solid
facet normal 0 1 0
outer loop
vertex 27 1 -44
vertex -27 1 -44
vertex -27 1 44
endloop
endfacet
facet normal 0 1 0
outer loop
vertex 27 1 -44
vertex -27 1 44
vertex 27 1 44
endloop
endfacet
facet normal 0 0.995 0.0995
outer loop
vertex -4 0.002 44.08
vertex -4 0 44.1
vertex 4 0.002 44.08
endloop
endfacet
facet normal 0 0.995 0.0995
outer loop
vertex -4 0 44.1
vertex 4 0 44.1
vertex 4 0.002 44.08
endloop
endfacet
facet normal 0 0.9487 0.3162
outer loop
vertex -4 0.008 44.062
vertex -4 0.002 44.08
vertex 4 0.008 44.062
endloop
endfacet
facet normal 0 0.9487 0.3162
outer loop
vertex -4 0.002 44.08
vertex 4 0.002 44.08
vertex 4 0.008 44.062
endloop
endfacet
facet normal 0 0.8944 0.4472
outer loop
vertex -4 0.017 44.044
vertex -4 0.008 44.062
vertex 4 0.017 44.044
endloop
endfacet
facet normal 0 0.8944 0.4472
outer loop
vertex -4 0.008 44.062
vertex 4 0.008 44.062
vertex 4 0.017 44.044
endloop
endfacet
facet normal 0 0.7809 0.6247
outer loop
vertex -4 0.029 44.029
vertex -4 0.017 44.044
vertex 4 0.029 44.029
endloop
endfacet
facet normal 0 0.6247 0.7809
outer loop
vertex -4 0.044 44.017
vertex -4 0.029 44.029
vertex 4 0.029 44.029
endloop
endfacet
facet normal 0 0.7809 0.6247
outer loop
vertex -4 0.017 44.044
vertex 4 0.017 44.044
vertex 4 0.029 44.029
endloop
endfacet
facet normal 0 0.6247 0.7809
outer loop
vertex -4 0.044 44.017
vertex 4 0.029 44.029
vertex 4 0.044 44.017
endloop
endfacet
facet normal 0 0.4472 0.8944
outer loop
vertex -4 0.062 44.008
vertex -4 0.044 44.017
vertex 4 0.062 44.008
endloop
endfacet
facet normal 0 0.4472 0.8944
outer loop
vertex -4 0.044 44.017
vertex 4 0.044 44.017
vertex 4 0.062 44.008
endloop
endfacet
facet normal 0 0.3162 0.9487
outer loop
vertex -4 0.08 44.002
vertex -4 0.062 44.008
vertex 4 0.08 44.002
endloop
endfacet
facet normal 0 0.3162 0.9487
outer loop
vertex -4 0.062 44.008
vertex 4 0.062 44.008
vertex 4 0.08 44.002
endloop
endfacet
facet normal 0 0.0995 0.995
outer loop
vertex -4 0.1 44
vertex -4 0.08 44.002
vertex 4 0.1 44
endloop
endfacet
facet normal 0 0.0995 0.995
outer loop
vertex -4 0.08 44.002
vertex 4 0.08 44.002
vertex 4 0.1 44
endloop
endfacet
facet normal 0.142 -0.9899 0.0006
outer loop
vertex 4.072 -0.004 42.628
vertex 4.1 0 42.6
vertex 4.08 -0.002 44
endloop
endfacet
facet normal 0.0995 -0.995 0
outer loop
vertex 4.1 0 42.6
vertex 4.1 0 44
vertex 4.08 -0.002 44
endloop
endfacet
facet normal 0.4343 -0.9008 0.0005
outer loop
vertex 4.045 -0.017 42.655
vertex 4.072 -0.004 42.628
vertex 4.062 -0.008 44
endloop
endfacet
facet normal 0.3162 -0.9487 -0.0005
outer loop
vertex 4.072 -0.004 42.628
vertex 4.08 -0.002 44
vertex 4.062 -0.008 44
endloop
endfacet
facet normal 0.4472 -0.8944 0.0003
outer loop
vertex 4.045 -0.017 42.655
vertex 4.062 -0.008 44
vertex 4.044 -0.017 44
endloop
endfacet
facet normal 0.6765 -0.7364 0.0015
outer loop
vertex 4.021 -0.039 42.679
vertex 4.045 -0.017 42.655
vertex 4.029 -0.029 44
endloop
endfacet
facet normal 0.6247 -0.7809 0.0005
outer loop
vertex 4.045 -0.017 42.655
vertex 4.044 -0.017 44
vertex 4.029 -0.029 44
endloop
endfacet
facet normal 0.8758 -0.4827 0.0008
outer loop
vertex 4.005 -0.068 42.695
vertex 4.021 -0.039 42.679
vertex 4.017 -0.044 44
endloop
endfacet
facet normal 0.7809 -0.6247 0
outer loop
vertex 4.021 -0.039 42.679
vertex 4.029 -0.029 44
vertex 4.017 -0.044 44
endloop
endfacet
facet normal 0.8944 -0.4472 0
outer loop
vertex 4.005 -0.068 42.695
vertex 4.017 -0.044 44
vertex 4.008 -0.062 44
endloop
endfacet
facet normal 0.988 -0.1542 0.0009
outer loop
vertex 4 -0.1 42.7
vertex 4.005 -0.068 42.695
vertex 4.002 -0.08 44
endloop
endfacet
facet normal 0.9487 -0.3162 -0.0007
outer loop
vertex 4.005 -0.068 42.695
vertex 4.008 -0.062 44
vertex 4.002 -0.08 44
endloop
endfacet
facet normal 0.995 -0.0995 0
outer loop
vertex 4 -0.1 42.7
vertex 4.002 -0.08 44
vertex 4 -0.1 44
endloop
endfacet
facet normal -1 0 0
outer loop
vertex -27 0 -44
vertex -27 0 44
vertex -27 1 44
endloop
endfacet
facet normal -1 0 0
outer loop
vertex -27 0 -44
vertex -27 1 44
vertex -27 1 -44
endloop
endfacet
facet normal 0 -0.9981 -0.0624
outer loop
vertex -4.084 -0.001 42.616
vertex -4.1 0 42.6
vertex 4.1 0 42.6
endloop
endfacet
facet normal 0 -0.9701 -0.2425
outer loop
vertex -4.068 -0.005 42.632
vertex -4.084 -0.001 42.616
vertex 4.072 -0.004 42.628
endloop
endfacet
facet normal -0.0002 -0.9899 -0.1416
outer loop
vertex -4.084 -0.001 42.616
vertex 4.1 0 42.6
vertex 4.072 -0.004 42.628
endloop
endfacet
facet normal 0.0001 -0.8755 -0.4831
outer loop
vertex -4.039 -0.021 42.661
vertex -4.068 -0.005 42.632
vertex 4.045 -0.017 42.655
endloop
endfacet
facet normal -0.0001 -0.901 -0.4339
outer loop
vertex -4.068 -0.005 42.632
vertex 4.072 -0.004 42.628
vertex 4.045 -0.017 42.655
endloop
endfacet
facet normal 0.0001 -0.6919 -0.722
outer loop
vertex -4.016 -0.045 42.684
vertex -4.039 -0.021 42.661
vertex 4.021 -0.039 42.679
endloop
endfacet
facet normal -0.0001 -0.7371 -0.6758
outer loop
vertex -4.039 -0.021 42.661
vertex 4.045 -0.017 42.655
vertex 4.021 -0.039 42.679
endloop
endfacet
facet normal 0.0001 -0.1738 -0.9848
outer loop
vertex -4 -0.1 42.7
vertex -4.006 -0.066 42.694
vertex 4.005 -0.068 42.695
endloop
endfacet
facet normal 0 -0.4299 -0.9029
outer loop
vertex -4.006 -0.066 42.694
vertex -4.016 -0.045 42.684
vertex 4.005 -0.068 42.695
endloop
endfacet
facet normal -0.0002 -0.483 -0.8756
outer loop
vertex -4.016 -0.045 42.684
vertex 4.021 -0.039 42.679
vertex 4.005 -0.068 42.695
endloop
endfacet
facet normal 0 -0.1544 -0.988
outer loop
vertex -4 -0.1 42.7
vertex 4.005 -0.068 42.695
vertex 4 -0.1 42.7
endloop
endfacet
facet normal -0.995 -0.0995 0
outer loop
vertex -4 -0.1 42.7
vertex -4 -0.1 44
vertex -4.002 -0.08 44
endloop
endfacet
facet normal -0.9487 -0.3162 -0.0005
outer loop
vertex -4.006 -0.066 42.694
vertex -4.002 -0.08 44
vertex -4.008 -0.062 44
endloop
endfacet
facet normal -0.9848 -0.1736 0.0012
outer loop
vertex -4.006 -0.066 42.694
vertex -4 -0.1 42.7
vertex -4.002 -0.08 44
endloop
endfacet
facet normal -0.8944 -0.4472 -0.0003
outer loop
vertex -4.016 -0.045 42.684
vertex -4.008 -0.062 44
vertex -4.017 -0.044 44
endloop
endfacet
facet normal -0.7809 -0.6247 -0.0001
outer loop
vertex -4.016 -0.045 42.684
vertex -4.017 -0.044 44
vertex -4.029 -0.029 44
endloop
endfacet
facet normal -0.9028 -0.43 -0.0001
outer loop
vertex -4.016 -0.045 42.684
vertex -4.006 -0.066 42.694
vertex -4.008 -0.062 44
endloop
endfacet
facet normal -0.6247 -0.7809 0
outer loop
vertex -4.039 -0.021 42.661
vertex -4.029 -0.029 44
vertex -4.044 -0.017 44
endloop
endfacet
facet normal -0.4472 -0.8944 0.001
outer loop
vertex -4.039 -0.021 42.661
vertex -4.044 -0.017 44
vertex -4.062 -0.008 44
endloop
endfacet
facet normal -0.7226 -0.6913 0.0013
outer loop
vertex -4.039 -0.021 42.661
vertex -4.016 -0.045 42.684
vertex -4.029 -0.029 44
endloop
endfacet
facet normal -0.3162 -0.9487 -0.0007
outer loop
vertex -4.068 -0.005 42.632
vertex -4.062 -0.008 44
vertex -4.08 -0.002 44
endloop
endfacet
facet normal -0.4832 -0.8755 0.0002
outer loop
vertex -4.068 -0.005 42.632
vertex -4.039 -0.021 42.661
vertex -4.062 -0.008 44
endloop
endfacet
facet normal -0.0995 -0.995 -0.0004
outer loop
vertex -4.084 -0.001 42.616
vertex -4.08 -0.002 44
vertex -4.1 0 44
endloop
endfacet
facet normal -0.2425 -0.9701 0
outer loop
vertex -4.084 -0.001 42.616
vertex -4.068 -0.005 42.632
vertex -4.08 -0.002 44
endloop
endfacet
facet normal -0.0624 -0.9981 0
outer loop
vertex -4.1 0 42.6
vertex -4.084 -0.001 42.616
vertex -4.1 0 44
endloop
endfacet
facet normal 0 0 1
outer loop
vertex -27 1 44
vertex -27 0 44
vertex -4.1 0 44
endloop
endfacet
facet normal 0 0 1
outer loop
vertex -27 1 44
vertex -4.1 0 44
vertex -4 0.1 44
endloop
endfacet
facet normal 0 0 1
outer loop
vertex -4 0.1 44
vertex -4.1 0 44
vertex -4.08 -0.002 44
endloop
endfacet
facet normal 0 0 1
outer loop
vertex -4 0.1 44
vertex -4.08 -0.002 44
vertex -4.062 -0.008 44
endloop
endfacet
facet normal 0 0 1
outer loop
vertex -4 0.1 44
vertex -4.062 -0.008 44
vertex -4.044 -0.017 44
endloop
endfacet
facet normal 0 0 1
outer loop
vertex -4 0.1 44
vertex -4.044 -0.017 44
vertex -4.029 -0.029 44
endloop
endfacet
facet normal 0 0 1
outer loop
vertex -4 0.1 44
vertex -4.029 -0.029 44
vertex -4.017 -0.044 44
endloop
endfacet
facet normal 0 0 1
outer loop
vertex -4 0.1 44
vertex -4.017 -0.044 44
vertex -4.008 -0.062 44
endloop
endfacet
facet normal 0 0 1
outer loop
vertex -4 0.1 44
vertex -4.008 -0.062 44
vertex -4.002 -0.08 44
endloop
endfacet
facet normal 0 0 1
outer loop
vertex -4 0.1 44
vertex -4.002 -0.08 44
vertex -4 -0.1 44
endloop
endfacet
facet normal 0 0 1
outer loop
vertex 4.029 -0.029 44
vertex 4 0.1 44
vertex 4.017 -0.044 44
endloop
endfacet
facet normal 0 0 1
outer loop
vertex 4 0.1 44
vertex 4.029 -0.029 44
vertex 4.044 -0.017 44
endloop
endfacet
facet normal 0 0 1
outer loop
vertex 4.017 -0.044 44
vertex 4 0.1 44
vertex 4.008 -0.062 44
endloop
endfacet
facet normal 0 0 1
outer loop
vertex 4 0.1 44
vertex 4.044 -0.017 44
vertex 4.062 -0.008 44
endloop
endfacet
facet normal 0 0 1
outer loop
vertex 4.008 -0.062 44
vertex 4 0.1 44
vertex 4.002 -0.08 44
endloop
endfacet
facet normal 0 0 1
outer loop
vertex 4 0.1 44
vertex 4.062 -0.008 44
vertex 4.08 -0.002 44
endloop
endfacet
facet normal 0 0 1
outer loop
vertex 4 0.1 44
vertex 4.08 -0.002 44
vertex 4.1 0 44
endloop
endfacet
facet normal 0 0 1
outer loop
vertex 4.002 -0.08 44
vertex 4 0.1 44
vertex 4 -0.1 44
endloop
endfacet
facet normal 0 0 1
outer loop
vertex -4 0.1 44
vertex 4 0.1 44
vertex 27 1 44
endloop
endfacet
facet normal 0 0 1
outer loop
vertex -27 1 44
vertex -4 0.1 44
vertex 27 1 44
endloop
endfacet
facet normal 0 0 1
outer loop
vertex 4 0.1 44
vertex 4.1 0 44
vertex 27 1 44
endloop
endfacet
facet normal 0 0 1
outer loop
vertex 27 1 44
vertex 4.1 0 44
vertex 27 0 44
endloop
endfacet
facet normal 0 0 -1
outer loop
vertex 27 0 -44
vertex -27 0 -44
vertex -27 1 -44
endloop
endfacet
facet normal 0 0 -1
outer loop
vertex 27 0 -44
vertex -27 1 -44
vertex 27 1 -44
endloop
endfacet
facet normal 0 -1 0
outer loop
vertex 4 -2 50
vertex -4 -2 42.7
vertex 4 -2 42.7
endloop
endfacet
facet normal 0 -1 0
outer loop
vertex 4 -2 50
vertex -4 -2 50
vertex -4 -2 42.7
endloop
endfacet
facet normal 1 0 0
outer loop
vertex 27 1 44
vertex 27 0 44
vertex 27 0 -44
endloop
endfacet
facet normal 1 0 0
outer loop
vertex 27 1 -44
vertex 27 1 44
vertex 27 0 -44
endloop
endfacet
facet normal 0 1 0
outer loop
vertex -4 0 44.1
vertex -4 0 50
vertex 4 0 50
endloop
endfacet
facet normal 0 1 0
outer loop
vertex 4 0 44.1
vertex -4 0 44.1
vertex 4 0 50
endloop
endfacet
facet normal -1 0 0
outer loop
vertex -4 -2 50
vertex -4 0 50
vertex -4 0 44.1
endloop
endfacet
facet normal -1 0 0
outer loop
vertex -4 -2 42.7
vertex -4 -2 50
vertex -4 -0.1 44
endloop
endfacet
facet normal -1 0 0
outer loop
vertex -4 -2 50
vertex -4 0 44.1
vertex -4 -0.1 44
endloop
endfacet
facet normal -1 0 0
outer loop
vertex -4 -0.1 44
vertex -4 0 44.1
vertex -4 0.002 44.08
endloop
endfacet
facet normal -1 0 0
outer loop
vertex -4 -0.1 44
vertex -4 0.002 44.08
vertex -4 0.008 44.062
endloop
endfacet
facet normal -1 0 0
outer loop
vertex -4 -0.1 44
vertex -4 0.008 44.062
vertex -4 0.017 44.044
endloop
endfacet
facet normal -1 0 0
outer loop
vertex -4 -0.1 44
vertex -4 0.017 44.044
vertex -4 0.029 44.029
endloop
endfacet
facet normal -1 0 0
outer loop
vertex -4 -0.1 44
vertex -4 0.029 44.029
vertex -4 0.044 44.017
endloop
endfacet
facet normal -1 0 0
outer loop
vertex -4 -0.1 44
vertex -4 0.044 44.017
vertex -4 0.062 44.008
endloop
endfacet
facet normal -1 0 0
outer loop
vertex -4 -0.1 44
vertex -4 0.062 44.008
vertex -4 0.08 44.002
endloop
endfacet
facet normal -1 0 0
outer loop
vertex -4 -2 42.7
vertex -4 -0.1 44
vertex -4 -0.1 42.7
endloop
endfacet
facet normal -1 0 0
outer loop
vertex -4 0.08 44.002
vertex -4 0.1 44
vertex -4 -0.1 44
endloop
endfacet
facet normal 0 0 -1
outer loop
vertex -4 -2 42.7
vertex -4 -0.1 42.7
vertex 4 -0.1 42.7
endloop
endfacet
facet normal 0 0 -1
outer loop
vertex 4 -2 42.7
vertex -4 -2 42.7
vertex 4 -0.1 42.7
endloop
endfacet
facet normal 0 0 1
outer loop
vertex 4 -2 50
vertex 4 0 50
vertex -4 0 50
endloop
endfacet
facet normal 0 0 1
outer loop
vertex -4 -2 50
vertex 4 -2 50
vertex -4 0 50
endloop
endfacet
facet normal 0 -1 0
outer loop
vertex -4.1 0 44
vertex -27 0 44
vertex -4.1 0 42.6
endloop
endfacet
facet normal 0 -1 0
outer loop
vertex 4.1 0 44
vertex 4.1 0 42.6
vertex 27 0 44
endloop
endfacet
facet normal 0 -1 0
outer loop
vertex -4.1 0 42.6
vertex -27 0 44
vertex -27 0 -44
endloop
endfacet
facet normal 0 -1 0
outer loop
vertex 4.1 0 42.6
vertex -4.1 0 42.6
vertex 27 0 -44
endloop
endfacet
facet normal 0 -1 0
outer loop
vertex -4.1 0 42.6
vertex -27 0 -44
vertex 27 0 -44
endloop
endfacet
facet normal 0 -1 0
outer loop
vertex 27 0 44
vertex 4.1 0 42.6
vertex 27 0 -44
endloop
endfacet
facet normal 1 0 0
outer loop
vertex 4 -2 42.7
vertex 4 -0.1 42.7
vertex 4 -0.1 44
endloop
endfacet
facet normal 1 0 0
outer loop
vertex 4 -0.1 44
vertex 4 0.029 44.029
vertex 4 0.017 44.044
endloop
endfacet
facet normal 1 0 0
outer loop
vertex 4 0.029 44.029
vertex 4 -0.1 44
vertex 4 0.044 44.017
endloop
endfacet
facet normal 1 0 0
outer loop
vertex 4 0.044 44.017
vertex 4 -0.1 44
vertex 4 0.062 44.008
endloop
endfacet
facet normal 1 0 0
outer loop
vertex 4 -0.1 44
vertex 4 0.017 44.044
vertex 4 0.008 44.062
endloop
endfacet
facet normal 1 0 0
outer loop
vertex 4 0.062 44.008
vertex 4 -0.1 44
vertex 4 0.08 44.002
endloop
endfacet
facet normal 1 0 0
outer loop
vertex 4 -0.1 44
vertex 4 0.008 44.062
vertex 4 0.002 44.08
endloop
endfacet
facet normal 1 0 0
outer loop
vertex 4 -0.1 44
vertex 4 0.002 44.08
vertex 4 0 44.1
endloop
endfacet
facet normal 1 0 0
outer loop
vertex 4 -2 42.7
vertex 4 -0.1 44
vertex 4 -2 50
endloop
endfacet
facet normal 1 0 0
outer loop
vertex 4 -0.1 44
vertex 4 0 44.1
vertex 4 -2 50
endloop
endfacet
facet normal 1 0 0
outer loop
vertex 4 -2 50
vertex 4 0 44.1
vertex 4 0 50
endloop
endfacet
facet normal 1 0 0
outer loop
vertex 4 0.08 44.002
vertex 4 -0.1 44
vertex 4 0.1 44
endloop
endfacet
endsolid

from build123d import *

# Parameters (mm, degrees)
SKETCH1_W           = 54
SKETCH1_H           = 88
BOSS_EXTRUDE1_DEPTH = 1
BOSS_EXTRUDE2_DEPTH = 2
FILLET4_R           = 0.1
FILLET5_R           = 0.1


with BuildPart() as part:
    # Sketch1 → Boss-Extrude1 (new body)
    with BuildSketch(Plane(origin=(0, 0, 0), x_dir=(1, 0, 0), z_dir=(0, 1, 0))):
        Rectangle(SKETCH1_W, SKETCH1_H)
    extrude(amount=BOSS_EXTRUDE1_DEPTH)

    # Sketch2 → Boss-Extrude2 (add)
    with BuildSketch(Plane.XZ):
        Polygon((-4, 42.7), (4, 42.7), (4, 44), (4, 50), (-4, 50), (-4, 44), align=None)
    extrude(amount=BOSS_EXTRUDE2_DEPTH)

    # Fillet4
    fillet4_edges = [part.edges().sort_by_distance(p)[0] for p in [
        (0, 0, 44),
    ]]
    fillet(fillet4_edges, radius=FILLET4_R)

    # Fillet5
    fillet5_edges = [part.edges().sort_by_distance(p)[0] for p in [
        (-4, 0, 43.35),
        (0, 0, 42.7),
        (4, 0, 43.35),
    ]]
    fillet(fillet5_edges, radius=FILLET5_R)


solid = part.part
